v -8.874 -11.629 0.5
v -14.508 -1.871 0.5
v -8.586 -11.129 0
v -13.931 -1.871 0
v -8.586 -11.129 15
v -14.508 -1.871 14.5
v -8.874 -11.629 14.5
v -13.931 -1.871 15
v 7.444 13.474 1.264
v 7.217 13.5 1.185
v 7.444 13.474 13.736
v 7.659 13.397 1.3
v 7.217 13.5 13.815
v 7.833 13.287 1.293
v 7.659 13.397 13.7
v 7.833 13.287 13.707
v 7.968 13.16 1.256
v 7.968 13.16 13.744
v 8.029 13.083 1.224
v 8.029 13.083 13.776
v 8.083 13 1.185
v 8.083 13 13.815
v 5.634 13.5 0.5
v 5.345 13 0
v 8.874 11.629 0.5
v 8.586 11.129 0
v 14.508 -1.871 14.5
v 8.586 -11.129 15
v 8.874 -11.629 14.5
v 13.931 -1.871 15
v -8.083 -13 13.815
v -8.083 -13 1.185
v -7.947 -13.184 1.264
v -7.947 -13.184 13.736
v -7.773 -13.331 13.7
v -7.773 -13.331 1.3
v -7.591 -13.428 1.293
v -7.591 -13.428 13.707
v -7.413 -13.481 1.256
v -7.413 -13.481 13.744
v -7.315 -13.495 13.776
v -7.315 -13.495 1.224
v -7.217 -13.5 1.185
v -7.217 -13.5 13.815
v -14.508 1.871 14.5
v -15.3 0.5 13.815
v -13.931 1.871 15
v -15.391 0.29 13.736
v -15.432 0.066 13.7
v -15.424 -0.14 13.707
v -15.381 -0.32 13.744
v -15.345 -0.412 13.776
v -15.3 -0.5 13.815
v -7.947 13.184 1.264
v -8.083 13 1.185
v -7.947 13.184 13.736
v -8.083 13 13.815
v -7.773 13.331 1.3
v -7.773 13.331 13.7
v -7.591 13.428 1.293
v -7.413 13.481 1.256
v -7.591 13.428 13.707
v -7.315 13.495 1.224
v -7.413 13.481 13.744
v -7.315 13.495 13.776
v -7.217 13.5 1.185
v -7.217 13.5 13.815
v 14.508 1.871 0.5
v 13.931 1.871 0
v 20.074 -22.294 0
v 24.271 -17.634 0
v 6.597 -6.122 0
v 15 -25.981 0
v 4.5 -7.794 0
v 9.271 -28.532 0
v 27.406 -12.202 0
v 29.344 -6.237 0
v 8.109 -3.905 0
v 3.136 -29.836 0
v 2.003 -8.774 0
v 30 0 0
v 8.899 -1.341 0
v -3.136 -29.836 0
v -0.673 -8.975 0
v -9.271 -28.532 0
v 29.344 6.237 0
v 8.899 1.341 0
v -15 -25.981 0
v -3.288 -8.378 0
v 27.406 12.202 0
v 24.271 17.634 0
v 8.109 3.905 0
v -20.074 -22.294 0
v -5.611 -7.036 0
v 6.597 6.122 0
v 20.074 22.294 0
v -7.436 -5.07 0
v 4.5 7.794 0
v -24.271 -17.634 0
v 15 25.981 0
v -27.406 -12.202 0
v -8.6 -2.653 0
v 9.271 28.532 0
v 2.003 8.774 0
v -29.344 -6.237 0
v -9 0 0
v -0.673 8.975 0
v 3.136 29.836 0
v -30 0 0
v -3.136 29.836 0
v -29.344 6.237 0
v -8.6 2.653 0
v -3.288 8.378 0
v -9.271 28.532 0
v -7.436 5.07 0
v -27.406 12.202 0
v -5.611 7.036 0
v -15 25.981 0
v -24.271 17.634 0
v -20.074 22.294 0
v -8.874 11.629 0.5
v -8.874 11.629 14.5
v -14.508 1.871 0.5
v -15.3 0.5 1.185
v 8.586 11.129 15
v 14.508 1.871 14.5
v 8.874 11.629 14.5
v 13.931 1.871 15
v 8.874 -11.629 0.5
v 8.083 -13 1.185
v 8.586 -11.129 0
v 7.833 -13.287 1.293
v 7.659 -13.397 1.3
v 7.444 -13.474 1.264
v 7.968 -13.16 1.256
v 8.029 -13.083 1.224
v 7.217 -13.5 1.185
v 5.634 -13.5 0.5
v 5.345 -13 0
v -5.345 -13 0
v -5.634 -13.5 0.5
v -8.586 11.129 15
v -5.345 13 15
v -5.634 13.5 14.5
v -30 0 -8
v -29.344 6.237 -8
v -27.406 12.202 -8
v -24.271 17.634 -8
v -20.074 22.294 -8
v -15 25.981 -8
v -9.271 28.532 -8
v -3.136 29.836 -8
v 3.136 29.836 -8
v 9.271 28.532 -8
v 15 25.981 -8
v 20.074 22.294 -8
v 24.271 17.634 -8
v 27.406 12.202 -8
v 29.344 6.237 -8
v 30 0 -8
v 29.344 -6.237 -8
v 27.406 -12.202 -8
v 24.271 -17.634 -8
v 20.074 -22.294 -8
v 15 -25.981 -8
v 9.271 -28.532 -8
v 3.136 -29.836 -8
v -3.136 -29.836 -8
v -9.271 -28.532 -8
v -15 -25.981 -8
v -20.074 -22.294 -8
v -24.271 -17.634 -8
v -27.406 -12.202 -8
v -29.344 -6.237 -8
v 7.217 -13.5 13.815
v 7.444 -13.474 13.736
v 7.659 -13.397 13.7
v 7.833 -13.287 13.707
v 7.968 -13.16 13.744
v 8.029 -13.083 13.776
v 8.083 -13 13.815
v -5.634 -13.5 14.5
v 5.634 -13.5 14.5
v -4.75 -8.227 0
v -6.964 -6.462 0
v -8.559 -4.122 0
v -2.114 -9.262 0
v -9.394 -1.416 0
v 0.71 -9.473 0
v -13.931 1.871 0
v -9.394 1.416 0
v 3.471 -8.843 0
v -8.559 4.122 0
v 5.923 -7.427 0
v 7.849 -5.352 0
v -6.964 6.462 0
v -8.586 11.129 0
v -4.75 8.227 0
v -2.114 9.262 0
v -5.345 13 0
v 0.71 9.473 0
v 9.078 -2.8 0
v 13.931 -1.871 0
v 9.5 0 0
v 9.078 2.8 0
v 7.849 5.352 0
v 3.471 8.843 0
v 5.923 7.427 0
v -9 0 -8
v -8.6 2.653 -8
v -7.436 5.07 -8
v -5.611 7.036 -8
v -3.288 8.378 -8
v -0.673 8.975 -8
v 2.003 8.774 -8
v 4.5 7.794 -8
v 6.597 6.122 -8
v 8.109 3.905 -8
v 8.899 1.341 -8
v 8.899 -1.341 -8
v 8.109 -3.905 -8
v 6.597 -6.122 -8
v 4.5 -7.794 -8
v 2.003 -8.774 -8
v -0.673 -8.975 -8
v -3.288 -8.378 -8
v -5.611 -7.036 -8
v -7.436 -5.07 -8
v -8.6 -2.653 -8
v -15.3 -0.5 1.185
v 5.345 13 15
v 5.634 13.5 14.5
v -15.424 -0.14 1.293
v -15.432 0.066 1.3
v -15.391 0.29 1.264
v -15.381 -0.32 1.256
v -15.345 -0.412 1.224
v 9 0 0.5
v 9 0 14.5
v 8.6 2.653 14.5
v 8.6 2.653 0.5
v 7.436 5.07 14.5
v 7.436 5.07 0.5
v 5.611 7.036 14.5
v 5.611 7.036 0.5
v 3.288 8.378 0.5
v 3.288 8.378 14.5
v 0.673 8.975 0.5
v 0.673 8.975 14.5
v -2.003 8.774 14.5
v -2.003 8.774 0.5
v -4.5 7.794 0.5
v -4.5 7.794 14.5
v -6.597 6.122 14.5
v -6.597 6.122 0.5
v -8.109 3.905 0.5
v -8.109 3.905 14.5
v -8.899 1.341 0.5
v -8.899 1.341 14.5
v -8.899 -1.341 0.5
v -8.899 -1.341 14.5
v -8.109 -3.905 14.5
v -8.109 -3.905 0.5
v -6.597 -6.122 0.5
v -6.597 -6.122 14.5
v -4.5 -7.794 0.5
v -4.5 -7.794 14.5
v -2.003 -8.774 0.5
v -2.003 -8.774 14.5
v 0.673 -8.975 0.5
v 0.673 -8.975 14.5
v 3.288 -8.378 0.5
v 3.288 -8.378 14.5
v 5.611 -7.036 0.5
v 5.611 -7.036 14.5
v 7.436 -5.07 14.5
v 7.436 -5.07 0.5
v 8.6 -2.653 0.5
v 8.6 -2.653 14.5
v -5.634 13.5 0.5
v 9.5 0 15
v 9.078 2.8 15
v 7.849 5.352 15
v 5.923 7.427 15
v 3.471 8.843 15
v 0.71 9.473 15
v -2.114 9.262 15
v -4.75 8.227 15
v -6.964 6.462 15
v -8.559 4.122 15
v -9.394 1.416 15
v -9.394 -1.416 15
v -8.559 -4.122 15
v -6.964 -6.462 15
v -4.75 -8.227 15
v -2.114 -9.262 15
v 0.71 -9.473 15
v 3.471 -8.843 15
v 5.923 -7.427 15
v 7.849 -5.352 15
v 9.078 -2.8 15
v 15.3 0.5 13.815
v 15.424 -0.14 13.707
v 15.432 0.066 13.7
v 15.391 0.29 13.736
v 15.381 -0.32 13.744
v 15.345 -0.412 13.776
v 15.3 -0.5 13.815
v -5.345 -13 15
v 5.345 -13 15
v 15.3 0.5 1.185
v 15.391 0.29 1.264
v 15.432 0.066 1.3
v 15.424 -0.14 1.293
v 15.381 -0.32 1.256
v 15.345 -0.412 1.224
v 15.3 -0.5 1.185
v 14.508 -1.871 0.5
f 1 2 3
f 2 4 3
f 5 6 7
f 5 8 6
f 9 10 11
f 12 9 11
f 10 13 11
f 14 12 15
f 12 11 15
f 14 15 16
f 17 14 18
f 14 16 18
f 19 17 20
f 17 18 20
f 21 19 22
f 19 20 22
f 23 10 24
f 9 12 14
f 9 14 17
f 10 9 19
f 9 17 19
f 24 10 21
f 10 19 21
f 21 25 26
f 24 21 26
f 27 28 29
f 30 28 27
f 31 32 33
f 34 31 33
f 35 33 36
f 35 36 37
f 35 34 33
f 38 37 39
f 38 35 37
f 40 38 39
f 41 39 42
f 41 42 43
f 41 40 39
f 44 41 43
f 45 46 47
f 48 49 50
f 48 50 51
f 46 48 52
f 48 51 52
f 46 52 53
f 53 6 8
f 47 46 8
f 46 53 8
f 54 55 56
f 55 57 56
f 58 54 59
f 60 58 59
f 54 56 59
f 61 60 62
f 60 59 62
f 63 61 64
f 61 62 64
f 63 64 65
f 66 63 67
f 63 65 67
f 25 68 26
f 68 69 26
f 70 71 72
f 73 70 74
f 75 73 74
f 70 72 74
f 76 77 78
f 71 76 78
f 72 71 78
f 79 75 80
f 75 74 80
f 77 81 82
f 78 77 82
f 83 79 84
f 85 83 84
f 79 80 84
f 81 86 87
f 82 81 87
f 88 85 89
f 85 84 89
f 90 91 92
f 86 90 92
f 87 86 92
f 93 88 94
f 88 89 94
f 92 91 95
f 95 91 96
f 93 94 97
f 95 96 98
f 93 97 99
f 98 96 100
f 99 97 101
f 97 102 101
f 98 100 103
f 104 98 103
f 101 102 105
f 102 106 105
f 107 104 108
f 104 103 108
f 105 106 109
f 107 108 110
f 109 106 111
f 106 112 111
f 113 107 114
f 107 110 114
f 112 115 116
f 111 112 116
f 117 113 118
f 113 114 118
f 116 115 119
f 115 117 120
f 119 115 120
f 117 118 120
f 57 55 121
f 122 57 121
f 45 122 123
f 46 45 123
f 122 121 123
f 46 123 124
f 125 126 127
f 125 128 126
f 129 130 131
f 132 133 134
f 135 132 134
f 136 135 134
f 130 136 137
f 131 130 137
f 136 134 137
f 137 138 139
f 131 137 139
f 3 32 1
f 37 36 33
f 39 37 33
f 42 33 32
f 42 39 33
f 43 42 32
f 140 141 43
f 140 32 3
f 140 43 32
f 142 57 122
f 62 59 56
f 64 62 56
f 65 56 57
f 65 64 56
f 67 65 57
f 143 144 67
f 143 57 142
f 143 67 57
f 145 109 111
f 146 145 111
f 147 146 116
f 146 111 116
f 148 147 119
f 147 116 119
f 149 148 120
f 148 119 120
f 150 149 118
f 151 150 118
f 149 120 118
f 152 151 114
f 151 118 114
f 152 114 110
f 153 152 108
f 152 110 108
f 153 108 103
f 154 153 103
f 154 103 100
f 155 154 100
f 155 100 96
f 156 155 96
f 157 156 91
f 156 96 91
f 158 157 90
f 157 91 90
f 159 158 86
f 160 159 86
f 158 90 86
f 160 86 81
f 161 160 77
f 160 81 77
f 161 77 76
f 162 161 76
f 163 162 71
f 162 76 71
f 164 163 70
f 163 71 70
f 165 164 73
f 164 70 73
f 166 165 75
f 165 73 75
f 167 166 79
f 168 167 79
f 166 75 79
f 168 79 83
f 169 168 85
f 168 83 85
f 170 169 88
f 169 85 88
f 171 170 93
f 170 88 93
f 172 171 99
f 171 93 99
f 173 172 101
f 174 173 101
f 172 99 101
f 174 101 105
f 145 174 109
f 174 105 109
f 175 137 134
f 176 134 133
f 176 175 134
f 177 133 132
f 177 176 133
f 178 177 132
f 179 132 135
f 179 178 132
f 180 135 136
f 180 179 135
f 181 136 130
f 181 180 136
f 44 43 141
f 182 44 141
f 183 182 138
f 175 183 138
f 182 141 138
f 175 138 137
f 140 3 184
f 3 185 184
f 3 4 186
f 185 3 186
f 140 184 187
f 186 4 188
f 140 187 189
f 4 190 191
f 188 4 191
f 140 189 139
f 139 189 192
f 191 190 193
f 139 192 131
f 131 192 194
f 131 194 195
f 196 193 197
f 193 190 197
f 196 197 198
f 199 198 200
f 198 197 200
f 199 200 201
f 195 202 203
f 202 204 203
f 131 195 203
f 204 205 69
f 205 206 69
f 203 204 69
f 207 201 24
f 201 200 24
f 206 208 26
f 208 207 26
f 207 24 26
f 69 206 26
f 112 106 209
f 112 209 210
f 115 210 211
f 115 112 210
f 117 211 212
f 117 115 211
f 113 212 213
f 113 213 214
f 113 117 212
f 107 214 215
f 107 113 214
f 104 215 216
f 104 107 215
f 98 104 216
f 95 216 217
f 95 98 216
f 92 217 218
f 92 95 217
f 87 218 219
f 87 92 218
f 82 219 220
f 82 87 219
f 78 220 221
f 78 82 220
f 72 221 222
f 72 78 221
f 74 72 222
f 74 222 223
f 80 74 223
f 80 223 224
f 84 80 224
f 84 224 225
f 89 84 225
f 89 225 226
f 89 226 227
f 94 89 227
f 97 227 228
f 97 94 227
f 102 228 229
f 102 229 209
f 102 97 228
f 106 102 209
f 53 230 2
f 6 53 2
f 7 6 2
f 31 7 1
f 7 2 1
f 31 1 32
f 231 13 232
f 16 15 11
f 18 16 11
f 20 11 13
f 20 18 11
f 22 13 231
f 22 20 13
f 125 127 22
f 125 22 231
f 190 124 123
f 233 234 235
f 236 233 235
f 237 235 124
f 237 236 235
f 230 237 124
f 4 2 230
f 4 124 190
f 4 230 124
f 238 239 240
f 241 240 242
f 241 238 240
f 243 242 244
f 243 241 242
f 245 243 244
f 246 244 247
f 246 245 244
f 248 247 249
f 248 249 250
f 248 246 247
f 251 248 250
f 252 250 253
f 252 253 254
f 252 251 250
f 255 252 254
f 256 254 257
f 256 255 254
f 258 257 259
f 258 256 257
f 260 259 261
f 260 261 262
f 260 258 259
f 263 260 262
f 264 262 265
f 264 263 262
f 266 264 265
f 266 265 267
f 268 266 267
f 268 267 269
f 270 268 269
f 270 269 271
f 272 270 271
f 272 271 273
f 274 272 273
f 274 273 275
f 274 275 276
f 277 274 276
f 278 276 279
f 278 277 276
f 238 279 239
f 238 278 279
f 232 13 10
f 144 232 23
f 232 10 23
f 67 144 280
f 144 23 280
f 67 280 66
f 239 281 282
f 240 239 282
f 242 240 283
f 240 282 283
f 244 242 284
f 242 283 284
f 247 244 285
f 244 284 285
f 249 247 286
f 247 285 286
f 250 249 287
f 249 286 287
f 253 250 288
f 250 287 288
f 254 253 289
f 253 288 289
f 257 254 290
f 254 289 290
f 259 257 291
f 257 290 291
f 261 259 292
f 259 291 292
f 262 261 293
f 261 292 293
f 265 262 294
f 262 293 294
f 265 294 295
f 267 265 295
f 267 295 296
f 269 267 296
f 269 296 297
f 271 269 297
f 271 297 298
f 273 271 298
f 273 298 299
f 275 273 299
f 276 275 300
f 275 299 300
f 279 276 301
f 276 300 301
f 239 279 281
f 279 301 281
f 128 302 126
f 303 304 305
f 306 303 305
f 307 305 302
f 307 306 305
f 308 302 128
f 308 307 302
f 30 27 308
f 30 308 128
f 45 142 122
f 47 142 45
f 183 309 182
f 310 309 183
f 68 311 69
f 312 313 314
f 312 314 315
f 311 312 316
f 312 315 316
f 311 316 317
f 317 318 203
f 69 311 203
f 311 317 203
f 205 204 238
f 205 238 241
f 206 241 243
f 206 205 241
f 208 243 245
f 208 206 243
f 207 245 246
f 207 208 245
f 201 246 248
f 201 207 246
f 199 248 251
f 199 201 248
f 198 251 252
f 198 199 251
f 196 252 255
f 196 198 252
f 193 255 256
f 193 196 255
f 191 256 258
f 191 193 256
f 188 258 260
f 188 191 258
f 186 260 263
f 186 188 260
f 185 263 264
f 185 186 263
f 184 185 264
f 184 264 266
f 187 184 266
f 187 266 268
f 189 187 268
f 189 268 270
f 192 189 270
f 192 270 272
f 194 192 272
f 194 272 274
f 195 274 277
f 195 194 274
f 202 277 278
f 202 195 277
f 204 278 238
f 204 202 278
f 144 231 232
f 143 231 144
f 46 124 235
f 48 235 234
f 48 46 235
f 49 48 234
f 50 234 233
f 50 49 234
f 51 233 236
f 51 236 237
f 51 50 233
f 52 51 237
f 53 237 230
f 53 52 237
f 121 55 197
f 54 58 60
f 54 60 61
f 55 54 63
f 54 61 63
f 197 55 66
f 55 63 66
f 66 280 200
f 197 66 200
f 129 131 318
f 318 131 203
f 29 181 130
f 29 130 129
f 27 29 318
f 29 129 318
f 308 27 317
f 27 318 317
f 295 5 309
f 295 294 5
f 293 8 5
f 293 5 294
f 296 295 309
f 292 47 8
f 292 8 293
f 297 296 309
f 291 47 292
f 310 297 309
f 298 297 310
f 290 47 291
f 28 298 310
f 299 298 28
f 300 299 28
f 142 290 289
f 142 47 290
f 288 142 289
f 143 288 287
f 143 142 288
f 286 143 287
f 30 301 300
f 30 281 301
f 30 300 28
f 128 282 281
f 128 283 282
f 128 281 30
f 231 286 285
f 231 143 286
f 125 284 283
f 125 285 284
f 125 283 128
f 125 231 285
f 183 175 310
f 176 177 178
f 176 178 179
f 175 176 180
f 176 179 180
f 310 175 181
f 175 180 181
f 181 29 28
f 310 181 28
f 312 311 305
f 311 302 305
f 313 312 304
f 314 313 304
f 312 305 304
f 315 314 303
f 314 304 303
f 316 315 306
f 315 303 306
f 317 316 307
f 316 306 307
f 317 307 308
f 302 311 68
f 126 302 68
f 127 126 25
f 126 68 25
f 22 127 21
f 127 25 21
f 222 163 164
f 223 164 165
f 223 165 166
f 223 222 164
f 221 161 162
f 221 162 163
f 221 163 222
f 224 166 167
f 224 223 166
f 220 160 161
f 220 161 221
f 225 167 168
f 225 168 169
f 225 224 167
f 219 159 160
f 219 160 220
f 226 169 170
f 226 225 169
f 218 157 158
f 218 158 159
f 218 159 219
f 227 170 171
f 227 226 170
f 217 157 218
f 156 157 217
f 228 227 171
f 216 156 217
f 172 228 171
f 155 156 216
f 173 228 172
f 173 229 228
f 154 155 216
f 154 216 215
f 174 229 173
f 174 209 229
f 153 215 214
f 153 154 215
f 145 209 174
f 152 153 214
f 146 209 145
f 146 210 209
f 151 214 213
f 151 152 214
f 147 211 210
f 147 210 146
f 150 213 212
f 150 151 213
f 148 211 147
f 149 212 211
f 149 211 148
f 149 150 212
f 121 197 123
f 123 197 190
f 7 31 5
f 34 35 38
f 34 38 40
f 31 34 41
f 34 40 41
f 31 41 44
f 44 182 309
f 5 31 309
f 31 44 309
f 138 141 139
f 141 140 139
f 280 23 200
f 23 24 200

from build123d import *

# Parameters (mm, degrees)
SKETCH1_R           = 9
BOSS_EXTRUDE1_DEPTH = 15
CHAMFER1_SIZE       = 0.5
CHAMFER2_SIZE       = 2
FILLET1_R           = 1
SKETCH2_R           = 30
SKETCH2_R_2         = 9
BOSS_EXTRUDE2_DEPTH = 8


with BuildPart() as part:
    # Sketch1 → Boss-Extrude1 (new body)
    with BuildSketch(Plane.XY):
        Polygon((-7.794228634, 13.5), (-15.588457268, 0), (-7.794228634, -13.5), (7.794228634, -13.5), (15.588457268, 0), (7.794228634, 13.5), align=None)
        Circle(SKETCH1_R, mode=Mode.SUBTRACT)
    extrude(amount=BOSS_EXTRUDE1_DEPTH)

    # Chamfer1
    chamfer1_edges = [part.edges().sort_by_distance(p)[0] for p in [
        (-11.691342951, -6.75, 15),
        (0, -13.5, 15),
        (-9, 0, 0),
        (-9, 0, 15),
        (11.691342951, -6.75, 15),
        (11.691342951, 6.75, 15),
        (0, 13.5, 15),
        (11.691342951, 6.75, 0),
        (11.691342951, -6.75, 0),
        (0, -13.5, 0),
        (-11.691342951, -6.75, 0),
        (-11.691342951, 6.75, 0),
        (0, 13.5, 0),
        (-11.691342951, 6.75, 15),
    ]]
    chamfer(chamfer1_edges, length=CHAMFER1_SIZE)

    # Chamfer2
    chamfer2_edges = [part.edges().sort_by_distance(p)[0] for p in [
        (15.299782134, 0, 0.25),
        (7.649891067, -13.25, 0.25),
        (7.649891067, 13.25, 0.25),
        (-7.649891067, -13.25, 0.25),
        (-7.649891067, 13.25, 0.25),
        (-15.299782134, 0, 0.25),
        (-7.649891067, -13.25, 14.75),
        (-15.299782134, 0, 14.75),
        (7.649891067, -13.25, 14.75),
        (-7.649891067, 13.25, 14.75),
        (15.299782134, 0, 14.75),
        (7.649891067, 13.25, 14.75),
    ]]
    chamfer(chamfer2_edges, length=CHAMFER2_SIZE)

    # Fillet1
    fillet1_edges = [part.edges().sort_by_distance(p)[0] for p in [
        (-15.588457268, 0, 7.5),
        (-7.794228634, -13.5, 7.5),
        (-7.794228634, 13.5, 7.5),
        (7.794228634, -13.5, 7.5),
        (15.588457268, 0, 7.5),
        (7.794228634, 13.5, 7.5),
    ]]
    fillet(fillet1_edges, radius=FILLET1_R)


with BuildPart() as body_2:
    # Sketch2 → Boss-Extrude2 (new body)
    with BuildSketch(Plane(origin=(0, 0, 0), x_dir=(-1, 0, 0), z_dir=(0, 0, -1))):
        Circle(SKETCH2_R)
        Circle(SKETCH2_R_2, mode=Mode.SUBTRACT)
    extrude(amount=BOSS_EXTRUDE2_DEPTH)


solid = Compound([part.part, body_2.part])
